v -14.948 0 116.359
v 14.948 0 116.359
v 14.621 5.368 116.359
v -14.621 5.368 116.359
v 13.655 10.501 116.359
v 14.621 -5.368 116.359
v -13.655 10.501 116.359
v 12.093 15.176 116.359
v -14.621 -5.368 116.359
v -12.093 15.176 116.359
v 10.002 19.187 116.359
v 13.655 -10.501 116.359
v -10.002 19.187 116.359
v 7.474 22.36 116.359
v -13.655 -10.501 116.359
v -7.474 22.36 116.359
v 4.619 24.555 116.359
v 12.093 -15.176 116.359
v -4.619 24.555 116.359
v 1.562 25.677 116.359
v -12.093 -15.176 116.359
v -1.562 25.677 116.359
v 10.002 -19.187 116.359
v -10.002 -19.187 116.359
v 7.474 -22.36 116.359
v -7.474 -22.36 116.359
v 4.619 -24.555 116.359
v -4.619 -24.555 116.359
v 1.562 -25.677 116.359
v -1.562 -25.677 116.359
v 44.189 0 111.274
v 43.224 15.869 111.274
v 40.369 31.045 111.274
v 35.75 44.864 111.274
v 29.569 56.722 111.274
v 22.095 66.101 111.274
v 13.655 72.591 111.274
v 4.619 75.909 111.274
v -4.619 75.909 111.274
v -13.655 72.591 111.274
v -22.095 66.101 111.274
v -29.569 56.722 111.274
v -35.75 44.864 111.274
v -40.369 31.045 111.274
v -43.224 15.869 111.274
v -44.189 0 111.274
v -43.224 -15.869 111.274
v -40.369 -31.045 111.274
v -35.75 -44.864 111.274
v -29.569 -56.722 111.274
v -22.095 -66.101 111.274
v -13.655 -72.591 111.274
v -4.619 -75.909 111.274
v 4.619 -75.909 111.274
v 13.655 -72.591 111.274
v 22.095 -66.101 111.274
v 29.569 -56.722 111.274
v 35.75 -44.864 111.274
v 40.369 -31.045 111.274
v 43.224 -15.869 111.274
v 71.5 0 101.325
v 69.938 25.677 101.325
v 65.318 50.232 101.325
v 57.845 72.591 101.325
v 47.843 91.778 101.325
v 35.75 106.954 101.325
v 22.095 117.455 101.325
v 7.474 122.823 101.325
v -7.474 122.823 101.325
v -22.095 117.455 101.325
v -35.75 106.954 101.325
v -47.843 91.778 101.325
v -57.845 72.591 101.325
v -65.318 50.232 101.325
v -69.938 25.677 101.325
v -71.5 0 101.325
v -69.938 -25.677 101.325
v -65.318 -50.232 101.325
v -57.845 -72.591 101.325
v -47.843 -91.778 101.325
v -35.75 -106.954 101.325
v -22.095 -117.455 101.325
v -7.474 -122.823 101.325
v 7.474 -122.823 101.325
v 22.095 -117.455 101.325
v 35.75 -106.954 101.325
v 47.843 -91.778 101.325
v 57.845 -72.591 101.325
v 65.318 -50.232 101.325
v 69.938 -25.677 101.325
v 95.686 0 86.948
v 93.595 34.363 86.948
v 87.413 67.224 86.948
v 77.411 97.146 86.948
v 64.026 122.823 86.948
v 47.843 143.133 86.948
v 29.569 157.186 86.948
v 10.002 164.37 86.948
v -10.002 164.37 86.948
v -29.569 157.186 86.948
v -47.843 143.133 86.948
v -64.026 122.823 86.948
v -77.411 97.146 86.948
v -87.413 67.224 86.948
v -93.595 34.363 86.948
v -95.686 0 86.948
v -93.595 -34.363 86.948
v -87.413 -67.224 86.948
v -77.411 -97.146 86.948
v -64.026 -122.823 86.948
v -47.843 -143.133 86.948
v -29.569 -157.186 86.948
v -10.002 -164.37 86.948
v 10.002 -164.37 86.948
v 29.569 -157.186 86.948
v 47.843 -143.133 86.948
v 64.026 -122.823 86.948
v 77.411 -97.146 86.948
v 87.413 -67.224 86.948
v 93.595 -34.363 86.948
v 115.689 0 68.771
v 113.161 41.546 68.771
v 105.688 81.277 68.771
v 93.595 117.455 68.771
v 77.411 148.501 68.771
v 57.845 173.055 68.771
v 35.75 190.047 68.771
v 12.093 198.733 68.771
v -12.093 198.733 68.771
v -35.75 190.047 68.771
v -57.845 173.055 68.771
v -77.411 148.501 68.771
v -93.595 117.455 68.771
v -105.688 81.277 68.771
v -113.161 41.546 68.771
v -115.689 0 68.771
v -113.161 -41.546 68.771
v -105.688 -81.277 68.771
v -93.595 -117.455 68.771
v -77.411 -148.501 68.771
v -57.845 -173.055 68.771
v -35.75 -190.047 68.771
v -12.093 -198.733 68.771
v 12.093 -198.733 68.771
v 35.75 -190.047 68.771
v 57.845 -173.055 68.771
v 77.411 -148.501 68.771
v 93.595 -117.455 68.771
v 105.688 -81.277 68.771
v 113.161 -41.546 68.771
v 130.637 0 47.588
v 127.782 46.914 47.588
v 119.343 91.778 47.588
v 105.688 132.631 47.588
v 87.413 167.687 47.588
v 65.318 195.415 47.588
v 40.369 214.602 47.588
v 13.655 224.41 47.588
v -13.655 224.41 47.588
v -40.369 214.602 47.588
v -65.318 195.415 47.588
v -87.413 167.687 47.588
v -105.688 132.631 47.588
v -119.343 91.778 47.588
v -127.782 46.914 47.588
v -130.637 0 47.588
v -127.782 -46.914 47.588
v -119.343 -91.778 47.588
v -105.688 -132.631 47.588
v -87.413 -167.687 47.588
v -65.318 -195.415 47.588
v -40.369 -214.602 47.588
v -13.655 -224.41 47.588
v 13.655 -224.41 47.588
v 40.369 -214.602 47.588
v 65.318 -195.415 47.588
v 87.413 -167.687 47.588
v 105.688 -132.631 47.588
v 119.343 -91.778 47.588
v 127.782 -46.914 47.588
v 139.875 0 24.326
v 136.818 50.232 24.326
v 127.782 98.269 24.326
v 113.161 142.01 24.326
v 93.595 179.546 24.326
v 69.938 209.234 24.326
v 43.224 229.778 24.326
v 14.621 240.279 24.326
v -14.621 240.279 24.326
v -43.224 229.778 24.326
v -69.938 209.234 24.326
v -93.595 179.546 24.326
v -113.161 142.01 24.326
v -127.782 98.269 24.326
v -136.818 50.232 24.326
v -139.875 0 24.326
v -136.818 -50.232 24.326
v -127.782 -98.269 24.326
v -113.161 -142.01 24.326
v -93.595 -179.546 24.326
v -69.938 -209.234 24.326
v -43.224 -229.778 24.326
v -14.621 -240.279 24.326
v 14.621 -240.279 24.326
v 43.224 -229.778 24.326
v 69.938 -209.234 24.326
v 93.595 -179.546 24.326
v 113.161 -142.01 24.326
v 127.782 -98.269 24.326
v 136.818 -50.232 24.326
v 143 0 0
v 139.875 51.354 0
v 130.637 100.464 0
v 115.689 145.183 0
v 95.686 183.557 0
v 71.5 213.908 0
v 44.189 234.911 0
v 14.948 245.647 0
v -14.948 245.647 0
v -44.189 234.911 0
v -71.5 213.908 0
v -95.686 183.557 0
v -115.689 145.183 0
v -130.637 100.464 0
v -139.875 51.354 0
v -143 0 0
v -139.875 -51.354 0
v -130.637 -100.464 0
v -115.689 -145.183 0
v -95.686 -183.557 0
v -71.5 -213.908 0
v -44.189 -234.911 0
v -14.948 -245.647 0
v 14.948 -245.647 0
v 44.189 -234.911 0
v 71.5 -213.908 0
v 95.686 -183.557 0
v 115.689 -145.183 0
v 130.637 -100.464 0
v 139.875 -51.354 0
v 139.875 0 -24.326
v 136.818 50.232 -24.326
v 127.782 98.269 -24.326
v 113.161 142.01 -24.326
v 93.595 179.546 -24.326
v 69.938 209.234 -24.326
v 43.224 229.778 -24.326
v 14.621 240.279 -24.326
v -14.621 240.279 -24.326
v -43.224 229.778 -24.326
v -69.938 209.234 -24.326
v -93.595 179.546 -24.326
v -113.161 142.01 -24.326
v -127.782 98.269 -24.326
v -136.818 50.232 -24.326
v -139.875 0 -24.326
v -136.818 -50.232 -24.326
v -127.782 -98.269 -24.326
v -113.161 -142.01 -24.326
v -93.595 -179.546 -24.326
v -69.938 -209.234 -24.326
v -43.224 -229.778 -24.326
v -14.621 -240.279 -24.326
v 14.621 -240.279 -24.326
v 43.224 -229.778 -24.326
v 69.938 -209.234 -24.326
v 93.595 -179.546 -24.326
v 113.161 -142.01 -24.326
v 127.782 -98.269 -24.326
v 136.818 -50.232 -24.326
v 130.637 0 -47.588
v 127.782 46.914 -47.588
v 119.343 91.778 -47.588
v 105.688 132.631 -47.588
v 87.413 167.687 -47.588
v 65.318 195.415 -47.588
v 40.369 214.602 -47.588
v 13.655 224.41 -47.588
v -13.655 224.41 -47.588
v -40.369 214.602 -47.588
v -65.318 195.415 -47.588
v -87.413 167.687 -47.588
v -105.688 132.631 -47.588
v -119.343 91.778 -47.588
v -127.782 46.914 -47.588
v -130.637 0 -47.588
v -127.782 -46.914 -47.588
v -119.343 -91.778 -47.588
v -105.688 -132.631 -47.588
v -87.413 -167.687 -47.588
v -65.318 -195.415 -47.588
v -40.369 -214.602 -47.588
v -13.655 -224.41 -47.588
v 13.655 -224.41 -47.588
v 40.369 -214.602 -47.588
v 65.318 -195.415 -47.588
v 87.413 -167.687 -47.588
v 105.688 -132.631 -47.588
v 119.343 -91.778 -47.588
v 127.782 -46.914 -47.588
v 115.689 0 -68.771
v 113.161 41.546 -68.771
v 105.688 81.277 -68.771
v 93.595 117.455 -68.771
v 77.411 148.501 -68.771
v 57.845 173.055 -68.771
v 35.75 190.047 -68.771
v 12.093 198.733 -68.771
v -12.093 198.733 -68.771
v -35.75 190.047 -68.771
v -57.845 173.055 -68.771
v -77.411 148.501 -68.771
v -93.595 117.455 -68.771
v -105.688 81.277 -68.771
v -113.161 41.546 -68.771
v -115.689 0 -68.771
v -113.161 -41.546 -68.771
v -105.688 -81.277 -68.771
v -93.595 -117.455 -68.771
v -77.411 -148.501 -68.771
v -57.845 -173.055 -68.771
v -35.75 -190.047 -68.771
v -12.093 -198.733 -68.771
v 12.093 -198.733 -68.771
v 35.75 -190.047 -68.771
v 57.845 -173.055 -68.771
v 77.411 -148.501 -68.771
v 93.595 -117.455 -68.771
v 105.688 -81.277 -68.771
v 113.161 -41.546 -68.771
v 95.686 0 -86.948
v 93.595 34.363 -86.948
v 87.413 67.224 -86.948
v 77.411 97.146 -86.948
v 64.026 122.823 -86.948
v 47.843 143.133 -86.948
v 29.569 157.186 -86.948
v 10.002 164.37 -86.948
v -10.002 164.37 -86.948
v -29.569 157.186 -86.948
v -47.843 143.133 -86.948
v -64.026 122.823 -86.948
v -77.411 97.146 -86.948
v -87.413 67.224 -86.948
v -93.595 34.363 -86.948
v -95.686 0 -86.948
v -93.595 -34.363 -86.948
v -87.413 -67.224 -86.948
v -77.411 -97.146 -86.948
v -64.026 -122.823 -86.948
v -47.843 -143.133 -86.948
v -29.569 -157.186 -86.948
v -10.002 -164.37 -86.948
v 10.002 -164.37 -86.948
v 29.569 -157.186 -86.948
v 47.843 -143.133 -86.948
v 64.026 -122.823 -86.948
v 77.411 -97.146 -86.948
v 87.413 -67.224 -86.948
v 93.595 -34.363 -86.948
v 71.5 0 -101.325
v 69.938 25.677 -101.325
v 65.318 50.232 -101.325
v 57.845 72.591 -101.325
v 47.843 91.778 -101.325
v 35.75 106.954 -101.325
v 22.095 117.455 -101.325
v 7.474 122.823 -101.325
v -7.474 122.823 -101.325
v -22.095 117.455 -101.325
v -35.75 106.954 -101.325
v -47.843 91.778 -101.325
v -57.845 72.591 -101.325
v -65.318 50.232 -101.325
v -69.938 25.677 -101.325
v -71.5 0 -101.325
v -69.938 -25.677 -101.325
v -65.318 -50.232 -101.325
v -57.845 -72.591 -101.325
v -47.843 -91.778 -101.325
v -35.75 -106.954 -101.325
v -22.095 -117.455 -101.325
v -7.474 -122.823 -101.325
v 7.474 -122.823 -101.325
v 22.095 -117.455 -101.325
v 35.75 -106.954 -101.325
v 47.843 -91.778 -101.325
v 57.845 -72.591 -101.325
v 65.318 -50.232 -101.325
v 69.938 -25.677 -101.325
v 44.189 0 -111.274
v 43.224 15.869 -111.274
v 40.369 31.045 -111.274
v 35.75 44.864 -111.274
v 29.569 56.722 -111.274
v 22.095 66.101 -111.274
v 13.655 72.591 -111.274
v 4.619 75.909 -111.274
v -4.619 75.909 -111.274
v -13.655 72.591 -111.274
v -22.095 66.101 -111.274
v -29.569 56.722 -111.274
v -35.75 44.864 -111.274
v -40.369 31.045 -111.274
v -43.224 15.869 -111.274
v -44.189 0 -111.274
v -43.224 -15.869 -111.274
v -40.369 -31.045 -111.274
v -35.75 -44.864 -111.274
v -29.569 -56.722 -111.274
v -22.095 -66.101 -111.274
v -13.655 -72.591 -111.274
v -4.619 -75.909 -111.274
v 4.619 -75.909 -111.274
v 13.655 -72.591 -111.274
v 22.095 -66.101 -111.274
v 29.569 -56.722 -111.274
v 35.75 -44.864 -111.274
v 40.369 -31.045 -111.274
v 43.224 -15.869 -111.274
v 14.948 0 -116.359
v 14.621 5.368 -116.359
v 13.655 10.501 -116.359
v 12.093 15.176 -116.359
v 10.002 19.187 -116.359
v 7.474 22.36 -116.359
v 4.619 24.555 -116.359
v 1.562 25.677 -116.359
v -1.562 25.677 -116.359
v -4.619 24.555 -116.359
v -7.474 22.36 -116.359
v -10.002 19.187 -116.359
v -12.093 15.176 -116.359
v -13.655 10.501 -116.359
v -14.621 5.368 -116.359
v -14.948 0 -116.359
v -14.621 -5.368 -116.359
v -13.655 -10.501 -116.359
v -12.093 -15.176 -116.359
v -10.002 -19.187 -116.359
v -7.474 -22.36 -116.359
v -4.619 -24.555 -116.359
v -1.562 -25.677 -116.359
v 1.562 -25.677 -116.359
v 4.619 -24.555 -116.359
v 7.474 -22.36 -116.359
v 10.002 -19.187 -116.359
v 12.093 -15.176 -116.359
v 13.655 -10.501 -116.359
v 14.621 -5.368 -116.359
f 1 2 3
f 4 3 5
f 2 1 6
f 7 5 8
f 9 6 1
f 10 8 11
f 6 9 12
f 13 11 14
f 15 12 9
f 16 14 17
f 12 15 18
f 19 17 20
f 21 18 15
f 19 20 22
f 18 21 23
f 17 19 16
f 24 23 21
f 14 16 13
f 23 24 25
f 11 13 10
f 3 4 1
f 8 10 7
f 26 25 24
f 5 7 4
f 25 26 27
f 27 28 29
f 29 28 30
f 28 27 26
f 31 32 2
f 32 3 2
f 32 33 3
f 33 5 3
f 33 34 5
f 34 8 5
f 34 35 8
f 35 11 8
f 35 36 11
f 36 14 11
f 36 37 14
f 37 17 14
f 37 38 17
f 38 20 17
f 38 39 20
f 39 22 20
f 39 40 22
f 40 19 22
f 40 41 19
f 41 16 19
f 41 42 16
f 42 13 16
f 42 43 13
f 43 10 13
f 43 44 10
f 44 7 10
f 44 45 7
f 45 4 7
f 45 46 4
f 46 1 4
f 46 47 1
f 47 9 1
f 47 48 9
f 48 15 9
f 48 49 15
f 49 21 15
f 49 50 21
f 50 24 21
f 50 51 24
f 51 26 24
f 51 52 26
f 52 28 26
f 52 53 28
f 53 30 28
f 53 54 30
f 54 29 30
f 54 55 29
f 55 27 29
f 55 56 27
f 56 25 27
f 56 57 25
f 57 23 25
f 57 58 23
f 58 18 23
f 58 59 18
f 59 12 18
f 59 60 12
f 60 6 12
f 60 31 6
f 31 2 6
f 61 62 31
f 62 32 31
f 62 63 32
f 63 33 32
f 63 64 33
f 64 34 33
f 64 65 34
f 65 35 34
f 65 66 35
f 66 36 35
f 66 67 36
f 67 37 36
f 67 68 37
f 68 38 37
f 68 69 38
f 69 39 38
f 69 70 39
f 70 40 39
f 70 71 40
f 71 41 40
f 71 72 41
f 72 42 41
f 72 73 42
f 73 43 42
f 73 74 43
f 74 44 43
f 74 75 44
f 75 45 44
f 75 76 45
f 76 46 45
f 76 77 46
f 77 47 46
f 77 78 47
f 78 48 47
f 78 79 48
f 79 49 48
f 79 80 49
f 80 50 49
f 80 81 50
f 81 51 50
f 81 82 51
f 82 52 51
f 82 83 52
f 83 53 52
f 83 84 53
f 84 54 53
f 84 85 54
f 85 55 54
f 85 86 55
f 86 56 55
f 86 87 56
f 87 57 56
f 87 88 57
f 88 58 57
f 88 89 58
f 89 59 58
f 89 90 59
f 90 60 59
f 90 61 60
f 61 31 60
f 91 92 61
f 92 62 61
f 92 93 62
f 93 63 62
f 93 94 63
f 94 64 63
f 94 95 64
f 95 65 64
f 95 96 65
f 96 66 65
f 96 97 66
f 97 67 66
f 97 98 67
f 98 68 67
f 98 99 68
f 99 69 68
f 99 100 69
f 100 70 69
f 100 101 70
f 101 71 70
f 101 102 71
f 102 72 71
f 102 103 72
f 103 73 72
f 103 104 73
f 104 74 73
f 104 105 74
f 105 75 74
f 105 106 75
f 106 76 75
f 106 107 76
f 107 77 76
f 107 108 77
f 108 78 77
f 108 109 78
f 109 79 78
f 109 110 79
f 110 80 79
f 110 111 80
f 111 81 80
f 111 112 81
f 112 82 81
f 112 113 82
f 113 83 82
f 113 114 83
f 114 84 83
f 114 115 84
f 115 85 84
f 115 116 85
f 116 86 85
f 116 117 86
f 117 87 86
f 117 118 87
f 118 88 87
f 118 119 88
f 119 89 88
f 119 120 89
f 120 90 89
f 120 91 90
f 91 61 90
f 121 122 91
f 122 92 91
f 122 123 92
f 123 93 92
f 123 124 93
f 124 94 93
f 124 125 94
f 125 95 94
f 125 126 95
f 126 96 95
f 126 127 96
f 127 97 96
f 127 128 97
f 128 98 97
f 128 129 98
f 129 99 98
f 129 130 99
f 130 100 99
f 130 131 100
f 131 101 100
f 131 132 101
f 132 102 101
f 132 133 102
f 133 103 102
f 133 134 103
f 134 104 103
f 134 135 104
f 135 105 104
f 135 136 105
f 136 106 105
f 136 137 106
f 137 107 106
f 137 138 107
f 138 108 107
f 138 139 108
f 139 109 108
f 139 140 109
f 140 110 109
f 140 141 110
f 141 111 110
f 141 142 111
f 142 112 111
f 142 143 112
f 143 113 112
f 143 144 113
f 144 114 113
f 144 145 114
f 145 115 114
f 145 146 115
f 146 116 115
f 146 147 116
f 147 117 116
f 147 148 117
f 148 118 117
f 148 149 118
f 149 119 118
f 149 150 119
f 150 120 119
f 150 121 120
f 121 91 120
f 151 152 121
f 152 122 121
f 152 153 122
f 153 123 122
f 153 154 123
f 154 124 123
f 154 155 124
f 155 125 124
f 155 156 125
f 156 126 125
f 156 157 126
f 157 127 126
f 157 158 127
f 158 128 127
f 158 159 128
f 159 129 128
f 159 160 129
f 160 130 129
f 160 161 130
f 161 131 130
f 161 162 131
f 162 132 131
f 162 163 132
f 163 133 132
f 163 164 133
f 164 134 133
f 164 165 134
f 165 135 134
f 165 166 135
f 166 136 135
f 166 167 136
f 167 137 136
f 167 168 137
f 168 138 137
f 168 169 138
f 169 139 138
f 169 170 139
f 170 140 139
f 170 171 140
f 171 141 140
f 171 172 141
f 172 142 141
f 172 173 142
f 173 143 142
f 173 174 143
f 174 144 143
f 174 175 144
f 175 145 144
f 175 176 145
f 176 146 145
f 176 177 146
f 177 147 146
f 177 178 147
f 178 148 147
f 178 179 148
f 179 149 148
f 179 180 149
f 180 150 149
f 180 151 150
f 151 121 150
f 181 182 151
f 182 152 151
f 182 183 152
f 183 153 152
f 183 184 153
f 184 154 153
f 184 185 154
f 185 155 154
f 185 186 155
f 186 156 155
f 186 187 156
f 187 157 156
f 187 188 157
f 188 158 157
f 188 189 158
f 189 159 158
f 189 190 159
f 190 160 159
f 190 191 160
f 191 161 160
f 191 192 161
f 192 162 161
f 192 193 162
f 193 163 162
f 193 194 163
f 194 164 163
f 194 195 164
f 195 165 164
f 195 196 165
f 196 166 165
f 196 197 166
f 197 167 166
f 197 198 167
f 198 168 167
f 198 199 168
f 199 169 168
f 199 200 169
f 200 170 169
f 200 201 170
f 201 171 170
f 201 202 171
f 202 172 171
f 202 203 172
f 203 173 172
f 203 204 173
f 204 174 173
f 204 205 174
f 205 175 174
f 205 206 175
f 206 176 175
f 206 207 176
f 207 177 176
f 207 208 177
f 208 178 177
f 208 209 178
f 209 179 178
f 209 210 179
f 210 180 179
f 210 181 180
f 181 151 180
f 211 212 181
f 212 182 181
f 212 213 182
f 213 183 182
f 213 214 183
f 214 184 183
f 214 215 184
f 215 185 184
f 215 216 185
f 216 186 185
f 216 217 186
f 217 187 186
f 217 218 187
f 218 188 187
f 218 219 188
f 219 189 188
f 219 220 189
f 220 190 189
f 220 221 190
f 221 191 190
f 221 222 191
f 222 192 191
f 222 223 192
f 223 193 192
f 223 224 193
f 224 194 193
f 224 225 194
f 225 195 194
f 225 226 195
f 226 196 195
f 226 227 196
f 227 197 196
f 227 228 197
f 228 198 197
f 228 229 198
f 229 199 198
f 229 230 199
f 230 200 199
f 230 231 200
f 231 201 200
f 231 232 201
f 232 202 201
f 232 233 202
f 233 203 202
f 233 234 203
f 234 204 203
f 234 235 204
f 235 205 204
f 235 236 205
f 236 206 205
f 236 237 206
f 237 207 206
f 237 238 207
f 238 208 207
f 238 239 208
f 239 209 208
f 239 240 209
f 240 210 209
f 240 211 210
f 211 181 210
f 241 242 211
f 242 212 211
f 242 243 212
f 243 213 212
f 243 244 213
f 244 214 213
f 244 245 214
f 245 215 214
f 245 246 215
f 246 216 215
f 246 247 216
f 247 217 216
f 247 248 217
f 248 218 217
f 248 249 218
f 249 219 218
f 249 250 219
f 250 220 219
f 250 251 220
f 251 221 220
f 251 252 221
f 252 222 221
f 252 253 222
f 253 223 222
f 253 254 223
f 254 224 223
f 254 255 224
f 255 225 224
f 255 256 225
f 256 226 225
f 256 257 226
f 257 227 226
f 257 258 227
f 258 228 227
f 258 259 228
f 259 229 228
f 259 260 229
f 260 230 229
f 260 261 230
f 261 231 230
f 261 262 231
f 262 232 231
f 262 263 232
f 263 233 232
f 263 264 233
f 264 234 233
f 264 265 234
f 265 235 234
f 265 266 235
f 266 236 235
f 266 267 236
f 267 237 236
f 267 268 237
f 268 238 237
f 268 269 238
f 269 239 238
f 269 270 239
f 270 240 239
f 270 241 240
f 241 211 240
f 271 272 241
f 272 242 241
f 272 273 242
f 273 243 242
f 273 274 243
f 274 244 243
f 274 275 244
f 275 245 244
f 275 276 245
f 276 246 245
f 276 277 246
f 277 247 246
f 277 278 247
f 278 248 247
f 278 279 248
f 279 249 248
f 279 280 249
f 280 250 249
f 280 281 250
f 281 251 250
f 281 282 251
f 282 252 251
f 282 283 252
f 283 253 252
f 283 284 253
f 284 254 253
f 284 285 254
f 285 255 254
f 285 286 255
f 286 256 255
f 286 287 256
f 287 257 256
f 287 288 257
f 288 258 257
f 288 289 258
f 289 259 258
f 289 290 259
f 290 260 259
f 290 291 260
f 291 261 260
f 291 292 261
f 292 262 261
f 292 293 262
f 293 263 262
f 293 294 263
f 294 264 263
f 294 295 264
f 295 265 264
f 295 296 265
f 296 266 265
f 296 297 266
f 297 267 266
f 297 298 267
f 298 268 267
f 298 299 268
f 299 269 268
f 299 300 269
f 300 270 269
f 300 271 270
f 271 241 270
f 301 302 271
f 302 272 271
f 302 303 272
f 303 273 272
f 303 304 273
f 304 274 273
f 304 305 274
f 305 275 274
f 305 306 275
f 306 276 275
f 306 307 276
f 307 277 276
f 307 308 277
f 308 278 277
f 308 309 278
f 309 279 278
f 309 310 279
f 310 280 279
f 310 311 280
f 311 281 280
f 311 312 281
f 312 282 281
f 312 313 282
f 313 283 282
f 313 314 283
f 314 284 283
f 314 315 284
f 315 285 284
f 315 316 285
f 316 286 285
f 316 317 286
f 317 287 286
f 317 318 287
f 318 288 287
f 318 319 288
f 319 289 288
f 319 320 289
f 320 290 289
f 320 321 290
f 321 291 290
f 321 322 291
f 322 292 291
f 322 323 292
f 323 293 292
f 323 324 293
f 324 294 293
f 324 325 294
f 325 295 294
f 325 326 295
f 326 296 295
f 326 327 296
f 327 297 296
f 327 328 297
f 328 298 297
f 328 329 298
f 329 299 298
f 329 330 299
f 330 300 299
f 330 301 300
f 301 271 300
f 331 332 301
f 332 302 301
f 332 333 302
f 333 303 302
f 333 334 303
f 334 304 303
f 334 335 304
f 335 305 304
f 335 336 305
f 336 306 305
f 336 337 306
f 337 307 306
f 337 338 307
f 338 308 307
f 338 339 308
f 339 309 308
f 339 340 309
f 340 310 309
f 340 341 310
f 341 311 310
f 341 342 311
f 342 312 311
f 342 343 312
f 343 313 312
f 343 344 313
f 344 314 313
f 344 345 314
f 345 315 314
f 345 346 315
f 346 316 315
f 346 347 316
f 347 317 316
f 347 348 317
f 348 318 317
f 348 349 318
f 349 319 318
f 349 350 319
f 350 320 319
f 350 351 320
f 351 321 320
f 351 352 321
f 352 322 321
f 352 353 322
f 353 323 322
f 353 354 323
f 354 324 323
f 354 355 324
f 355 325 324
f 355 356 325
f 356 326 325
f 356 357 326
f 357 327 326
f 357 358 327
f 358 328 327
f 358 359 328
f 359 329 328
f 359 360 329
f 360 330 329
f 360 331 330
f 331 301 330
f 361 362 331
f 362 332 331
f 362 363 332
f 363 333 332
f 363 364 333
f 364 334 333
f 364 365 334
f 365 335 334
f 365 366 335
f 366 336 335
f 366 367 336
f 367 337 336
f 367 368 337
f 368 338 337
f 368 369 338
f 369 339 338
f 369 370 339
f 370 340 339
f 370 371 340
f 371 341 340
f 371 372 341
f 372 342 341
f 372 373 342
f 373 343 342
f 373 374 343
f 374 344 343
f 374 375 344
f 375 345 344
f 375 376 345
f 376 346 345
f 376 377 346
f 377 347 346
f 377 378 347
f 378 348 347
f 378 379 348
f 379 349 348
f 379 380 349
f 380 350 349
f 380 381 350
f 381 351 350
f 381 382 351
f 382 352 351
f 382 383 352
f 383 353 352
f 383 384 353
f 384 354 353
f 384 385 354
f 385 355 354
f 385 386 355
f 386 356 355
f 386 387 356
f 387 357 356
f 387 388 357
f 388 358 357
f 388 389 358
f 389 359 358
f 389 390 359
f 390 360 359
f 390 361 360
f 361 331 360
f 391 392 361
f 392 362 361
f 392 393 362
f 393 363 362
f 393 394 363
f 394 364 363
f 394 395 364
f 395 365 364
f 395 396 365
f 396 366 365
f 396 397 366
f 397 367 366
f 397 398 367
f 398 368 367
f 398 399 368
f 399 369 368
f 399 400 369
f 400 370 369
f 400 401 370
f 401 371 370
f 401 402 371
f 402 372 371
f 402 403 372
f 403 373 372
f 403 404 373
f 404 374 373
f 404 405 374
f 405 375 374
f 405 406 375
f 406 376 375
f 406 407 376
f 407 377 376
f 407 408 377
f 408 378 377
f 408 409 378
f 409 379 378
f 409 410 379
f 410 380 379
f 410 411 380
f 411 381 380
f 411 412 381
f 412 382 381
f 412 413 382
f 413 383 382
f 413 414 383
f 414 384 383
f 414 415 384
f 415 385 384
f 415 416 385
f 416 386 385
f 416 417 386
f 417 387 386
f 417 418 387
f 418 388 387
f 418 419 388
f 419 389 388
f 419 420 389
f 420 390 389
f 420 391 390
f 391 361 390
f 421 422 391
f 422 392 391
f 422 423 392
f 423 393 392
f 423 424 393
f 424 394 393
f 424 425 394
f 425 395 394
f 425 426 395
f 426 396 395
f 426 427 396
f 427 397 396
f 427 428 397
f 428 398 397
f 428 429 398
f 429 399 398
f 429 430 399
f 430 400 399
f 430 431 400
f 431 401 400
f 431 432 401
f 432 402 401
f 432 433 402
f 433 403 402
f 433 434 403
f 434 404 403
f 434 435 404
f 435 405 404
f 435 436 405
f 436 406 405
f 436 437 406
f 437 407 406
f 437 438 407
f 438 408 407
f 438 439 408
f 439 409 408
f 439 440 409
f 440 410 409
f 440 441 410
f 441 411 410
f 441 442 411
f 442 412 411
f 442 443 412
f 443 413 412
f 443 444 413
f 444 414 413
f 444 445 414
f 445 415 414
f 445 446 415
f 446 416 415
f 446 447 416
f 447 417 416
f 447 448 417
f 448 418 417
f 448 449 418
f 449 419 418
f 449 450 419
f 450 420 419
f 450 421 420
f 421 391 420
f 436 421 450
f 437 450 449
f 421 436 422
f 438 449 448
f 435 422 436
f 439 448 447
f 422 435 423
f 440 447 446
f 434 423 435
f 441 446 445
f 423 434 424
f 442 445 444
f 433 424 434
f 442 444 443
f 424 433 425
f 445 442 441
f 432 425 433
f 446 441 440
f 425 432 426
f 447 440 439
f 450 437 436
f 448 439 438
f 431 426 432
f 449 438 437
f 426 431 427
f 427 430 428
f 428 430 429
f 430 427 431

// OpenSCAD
// Generated by SolidPython 1.0.1 on 2020-07-29 00:46:50


scale(v = [11, 19, 9]) {
	sphere(r = 13);
}
/***********************************************
*********      SolidPython code:      **********
************************************************
 
# import packages: SolidPython
from solid import *
from solid.utils import *
from itertools import chain, combinations, permutations


class Resize:

    def __init__(self, scad_file):
        self.scad_file = scad_file
        #self.scad_file = import_scad(scad_file)
        # cone/cylinder param:
        self.r1 = 0
        self.r2 = 0
        self.h = 0
        # rectangular prism param:
        self.w = 0
        self.l = 0
        # ellipse param:
        self.r = 0

    # import OpenScad code (file name corresponds to shape)


    # classify shape + parameters
    def assign(self, param1, param2, param3):
        if self.scad_file == 'cone.scad':
            self.r1 = param1
            self.r2 = param2
            self.h = param3
        elif self.scad_file == 'cylinder.scad':
            self.r1 = param1
            self.r2 = param2
            self.h = param3
        elif self.scad_file == 'rectangularPrism.scad':
            self.h = param1
            self.l = param2
            self.w = param3
        else:
            self.r = param1
            self.h = param2

    # resize parameters
    def iterate(self):
        x = range(3, 20, 2)
        i = 1
        if self.scad_file == 'cone.scad':
            tempList = list(permutations(x, 2))
            for temp in tempList:
                param1 = temp[0]
                param2 = temp[1]
                filepath = 'produced_scad_files/' + 'cone' + str(param1) + '_' + str(param2) + '_' + '.scad'
                scad_render_to_file(cylinder(h=param1, r1=param2, r2=0), filepath)

        elif self.scad_file == 'cylinder.scad':
            tempList = list(permutations(x, 3))
            for temp in tempList:
                param1 = temp[0]
                param2 = temp[1]
                filepath = 'produced_scad_files/' + 'cylinder' + str(param1) + '_' + str(param2) + '_' + '.scad'
                scad_render_to_file(cylinder(h=param1, r1=param2, r2=param2), filepath)

        elif self.scad_file == 'rectangularPrism.scad':
            tempList = list(permutations(x, 3))
            for temp in tempList:
                param1 = temp[0]
                param2 = temp[1]
                param3 = temp[2]
                filepath = 'produced_scad_files/' + 'rectangularPrism' + str(param1) + '_' + str(param2) + '_' + str(
                    param3) + '.scad'
                scad_render_to_file(cube(size=(param1, param2, param3)), filepath)

        elif self.scad_file == 'ellipse.scad':
            tempList = list(permutations(x, 4))
            for temp in tempList:
                param1 = temp[0]
                param2 = temp[1]
                param3 = temp[2]
                param4 = temp[3]
                filepath = 'produced_scad_files/' + 'ellipse' + str(param1) + '_' + str(param2) + '_' + str(param3) + '_' + str(param4) + '.scad'
                scad_render_to_file(scale([param1, param2, param3])(sphere(r=param4)), filepath)

    def render_to_scadfile(self):
        scad_render_to_file(scad, 'example.scad') 
 
************************************************/
